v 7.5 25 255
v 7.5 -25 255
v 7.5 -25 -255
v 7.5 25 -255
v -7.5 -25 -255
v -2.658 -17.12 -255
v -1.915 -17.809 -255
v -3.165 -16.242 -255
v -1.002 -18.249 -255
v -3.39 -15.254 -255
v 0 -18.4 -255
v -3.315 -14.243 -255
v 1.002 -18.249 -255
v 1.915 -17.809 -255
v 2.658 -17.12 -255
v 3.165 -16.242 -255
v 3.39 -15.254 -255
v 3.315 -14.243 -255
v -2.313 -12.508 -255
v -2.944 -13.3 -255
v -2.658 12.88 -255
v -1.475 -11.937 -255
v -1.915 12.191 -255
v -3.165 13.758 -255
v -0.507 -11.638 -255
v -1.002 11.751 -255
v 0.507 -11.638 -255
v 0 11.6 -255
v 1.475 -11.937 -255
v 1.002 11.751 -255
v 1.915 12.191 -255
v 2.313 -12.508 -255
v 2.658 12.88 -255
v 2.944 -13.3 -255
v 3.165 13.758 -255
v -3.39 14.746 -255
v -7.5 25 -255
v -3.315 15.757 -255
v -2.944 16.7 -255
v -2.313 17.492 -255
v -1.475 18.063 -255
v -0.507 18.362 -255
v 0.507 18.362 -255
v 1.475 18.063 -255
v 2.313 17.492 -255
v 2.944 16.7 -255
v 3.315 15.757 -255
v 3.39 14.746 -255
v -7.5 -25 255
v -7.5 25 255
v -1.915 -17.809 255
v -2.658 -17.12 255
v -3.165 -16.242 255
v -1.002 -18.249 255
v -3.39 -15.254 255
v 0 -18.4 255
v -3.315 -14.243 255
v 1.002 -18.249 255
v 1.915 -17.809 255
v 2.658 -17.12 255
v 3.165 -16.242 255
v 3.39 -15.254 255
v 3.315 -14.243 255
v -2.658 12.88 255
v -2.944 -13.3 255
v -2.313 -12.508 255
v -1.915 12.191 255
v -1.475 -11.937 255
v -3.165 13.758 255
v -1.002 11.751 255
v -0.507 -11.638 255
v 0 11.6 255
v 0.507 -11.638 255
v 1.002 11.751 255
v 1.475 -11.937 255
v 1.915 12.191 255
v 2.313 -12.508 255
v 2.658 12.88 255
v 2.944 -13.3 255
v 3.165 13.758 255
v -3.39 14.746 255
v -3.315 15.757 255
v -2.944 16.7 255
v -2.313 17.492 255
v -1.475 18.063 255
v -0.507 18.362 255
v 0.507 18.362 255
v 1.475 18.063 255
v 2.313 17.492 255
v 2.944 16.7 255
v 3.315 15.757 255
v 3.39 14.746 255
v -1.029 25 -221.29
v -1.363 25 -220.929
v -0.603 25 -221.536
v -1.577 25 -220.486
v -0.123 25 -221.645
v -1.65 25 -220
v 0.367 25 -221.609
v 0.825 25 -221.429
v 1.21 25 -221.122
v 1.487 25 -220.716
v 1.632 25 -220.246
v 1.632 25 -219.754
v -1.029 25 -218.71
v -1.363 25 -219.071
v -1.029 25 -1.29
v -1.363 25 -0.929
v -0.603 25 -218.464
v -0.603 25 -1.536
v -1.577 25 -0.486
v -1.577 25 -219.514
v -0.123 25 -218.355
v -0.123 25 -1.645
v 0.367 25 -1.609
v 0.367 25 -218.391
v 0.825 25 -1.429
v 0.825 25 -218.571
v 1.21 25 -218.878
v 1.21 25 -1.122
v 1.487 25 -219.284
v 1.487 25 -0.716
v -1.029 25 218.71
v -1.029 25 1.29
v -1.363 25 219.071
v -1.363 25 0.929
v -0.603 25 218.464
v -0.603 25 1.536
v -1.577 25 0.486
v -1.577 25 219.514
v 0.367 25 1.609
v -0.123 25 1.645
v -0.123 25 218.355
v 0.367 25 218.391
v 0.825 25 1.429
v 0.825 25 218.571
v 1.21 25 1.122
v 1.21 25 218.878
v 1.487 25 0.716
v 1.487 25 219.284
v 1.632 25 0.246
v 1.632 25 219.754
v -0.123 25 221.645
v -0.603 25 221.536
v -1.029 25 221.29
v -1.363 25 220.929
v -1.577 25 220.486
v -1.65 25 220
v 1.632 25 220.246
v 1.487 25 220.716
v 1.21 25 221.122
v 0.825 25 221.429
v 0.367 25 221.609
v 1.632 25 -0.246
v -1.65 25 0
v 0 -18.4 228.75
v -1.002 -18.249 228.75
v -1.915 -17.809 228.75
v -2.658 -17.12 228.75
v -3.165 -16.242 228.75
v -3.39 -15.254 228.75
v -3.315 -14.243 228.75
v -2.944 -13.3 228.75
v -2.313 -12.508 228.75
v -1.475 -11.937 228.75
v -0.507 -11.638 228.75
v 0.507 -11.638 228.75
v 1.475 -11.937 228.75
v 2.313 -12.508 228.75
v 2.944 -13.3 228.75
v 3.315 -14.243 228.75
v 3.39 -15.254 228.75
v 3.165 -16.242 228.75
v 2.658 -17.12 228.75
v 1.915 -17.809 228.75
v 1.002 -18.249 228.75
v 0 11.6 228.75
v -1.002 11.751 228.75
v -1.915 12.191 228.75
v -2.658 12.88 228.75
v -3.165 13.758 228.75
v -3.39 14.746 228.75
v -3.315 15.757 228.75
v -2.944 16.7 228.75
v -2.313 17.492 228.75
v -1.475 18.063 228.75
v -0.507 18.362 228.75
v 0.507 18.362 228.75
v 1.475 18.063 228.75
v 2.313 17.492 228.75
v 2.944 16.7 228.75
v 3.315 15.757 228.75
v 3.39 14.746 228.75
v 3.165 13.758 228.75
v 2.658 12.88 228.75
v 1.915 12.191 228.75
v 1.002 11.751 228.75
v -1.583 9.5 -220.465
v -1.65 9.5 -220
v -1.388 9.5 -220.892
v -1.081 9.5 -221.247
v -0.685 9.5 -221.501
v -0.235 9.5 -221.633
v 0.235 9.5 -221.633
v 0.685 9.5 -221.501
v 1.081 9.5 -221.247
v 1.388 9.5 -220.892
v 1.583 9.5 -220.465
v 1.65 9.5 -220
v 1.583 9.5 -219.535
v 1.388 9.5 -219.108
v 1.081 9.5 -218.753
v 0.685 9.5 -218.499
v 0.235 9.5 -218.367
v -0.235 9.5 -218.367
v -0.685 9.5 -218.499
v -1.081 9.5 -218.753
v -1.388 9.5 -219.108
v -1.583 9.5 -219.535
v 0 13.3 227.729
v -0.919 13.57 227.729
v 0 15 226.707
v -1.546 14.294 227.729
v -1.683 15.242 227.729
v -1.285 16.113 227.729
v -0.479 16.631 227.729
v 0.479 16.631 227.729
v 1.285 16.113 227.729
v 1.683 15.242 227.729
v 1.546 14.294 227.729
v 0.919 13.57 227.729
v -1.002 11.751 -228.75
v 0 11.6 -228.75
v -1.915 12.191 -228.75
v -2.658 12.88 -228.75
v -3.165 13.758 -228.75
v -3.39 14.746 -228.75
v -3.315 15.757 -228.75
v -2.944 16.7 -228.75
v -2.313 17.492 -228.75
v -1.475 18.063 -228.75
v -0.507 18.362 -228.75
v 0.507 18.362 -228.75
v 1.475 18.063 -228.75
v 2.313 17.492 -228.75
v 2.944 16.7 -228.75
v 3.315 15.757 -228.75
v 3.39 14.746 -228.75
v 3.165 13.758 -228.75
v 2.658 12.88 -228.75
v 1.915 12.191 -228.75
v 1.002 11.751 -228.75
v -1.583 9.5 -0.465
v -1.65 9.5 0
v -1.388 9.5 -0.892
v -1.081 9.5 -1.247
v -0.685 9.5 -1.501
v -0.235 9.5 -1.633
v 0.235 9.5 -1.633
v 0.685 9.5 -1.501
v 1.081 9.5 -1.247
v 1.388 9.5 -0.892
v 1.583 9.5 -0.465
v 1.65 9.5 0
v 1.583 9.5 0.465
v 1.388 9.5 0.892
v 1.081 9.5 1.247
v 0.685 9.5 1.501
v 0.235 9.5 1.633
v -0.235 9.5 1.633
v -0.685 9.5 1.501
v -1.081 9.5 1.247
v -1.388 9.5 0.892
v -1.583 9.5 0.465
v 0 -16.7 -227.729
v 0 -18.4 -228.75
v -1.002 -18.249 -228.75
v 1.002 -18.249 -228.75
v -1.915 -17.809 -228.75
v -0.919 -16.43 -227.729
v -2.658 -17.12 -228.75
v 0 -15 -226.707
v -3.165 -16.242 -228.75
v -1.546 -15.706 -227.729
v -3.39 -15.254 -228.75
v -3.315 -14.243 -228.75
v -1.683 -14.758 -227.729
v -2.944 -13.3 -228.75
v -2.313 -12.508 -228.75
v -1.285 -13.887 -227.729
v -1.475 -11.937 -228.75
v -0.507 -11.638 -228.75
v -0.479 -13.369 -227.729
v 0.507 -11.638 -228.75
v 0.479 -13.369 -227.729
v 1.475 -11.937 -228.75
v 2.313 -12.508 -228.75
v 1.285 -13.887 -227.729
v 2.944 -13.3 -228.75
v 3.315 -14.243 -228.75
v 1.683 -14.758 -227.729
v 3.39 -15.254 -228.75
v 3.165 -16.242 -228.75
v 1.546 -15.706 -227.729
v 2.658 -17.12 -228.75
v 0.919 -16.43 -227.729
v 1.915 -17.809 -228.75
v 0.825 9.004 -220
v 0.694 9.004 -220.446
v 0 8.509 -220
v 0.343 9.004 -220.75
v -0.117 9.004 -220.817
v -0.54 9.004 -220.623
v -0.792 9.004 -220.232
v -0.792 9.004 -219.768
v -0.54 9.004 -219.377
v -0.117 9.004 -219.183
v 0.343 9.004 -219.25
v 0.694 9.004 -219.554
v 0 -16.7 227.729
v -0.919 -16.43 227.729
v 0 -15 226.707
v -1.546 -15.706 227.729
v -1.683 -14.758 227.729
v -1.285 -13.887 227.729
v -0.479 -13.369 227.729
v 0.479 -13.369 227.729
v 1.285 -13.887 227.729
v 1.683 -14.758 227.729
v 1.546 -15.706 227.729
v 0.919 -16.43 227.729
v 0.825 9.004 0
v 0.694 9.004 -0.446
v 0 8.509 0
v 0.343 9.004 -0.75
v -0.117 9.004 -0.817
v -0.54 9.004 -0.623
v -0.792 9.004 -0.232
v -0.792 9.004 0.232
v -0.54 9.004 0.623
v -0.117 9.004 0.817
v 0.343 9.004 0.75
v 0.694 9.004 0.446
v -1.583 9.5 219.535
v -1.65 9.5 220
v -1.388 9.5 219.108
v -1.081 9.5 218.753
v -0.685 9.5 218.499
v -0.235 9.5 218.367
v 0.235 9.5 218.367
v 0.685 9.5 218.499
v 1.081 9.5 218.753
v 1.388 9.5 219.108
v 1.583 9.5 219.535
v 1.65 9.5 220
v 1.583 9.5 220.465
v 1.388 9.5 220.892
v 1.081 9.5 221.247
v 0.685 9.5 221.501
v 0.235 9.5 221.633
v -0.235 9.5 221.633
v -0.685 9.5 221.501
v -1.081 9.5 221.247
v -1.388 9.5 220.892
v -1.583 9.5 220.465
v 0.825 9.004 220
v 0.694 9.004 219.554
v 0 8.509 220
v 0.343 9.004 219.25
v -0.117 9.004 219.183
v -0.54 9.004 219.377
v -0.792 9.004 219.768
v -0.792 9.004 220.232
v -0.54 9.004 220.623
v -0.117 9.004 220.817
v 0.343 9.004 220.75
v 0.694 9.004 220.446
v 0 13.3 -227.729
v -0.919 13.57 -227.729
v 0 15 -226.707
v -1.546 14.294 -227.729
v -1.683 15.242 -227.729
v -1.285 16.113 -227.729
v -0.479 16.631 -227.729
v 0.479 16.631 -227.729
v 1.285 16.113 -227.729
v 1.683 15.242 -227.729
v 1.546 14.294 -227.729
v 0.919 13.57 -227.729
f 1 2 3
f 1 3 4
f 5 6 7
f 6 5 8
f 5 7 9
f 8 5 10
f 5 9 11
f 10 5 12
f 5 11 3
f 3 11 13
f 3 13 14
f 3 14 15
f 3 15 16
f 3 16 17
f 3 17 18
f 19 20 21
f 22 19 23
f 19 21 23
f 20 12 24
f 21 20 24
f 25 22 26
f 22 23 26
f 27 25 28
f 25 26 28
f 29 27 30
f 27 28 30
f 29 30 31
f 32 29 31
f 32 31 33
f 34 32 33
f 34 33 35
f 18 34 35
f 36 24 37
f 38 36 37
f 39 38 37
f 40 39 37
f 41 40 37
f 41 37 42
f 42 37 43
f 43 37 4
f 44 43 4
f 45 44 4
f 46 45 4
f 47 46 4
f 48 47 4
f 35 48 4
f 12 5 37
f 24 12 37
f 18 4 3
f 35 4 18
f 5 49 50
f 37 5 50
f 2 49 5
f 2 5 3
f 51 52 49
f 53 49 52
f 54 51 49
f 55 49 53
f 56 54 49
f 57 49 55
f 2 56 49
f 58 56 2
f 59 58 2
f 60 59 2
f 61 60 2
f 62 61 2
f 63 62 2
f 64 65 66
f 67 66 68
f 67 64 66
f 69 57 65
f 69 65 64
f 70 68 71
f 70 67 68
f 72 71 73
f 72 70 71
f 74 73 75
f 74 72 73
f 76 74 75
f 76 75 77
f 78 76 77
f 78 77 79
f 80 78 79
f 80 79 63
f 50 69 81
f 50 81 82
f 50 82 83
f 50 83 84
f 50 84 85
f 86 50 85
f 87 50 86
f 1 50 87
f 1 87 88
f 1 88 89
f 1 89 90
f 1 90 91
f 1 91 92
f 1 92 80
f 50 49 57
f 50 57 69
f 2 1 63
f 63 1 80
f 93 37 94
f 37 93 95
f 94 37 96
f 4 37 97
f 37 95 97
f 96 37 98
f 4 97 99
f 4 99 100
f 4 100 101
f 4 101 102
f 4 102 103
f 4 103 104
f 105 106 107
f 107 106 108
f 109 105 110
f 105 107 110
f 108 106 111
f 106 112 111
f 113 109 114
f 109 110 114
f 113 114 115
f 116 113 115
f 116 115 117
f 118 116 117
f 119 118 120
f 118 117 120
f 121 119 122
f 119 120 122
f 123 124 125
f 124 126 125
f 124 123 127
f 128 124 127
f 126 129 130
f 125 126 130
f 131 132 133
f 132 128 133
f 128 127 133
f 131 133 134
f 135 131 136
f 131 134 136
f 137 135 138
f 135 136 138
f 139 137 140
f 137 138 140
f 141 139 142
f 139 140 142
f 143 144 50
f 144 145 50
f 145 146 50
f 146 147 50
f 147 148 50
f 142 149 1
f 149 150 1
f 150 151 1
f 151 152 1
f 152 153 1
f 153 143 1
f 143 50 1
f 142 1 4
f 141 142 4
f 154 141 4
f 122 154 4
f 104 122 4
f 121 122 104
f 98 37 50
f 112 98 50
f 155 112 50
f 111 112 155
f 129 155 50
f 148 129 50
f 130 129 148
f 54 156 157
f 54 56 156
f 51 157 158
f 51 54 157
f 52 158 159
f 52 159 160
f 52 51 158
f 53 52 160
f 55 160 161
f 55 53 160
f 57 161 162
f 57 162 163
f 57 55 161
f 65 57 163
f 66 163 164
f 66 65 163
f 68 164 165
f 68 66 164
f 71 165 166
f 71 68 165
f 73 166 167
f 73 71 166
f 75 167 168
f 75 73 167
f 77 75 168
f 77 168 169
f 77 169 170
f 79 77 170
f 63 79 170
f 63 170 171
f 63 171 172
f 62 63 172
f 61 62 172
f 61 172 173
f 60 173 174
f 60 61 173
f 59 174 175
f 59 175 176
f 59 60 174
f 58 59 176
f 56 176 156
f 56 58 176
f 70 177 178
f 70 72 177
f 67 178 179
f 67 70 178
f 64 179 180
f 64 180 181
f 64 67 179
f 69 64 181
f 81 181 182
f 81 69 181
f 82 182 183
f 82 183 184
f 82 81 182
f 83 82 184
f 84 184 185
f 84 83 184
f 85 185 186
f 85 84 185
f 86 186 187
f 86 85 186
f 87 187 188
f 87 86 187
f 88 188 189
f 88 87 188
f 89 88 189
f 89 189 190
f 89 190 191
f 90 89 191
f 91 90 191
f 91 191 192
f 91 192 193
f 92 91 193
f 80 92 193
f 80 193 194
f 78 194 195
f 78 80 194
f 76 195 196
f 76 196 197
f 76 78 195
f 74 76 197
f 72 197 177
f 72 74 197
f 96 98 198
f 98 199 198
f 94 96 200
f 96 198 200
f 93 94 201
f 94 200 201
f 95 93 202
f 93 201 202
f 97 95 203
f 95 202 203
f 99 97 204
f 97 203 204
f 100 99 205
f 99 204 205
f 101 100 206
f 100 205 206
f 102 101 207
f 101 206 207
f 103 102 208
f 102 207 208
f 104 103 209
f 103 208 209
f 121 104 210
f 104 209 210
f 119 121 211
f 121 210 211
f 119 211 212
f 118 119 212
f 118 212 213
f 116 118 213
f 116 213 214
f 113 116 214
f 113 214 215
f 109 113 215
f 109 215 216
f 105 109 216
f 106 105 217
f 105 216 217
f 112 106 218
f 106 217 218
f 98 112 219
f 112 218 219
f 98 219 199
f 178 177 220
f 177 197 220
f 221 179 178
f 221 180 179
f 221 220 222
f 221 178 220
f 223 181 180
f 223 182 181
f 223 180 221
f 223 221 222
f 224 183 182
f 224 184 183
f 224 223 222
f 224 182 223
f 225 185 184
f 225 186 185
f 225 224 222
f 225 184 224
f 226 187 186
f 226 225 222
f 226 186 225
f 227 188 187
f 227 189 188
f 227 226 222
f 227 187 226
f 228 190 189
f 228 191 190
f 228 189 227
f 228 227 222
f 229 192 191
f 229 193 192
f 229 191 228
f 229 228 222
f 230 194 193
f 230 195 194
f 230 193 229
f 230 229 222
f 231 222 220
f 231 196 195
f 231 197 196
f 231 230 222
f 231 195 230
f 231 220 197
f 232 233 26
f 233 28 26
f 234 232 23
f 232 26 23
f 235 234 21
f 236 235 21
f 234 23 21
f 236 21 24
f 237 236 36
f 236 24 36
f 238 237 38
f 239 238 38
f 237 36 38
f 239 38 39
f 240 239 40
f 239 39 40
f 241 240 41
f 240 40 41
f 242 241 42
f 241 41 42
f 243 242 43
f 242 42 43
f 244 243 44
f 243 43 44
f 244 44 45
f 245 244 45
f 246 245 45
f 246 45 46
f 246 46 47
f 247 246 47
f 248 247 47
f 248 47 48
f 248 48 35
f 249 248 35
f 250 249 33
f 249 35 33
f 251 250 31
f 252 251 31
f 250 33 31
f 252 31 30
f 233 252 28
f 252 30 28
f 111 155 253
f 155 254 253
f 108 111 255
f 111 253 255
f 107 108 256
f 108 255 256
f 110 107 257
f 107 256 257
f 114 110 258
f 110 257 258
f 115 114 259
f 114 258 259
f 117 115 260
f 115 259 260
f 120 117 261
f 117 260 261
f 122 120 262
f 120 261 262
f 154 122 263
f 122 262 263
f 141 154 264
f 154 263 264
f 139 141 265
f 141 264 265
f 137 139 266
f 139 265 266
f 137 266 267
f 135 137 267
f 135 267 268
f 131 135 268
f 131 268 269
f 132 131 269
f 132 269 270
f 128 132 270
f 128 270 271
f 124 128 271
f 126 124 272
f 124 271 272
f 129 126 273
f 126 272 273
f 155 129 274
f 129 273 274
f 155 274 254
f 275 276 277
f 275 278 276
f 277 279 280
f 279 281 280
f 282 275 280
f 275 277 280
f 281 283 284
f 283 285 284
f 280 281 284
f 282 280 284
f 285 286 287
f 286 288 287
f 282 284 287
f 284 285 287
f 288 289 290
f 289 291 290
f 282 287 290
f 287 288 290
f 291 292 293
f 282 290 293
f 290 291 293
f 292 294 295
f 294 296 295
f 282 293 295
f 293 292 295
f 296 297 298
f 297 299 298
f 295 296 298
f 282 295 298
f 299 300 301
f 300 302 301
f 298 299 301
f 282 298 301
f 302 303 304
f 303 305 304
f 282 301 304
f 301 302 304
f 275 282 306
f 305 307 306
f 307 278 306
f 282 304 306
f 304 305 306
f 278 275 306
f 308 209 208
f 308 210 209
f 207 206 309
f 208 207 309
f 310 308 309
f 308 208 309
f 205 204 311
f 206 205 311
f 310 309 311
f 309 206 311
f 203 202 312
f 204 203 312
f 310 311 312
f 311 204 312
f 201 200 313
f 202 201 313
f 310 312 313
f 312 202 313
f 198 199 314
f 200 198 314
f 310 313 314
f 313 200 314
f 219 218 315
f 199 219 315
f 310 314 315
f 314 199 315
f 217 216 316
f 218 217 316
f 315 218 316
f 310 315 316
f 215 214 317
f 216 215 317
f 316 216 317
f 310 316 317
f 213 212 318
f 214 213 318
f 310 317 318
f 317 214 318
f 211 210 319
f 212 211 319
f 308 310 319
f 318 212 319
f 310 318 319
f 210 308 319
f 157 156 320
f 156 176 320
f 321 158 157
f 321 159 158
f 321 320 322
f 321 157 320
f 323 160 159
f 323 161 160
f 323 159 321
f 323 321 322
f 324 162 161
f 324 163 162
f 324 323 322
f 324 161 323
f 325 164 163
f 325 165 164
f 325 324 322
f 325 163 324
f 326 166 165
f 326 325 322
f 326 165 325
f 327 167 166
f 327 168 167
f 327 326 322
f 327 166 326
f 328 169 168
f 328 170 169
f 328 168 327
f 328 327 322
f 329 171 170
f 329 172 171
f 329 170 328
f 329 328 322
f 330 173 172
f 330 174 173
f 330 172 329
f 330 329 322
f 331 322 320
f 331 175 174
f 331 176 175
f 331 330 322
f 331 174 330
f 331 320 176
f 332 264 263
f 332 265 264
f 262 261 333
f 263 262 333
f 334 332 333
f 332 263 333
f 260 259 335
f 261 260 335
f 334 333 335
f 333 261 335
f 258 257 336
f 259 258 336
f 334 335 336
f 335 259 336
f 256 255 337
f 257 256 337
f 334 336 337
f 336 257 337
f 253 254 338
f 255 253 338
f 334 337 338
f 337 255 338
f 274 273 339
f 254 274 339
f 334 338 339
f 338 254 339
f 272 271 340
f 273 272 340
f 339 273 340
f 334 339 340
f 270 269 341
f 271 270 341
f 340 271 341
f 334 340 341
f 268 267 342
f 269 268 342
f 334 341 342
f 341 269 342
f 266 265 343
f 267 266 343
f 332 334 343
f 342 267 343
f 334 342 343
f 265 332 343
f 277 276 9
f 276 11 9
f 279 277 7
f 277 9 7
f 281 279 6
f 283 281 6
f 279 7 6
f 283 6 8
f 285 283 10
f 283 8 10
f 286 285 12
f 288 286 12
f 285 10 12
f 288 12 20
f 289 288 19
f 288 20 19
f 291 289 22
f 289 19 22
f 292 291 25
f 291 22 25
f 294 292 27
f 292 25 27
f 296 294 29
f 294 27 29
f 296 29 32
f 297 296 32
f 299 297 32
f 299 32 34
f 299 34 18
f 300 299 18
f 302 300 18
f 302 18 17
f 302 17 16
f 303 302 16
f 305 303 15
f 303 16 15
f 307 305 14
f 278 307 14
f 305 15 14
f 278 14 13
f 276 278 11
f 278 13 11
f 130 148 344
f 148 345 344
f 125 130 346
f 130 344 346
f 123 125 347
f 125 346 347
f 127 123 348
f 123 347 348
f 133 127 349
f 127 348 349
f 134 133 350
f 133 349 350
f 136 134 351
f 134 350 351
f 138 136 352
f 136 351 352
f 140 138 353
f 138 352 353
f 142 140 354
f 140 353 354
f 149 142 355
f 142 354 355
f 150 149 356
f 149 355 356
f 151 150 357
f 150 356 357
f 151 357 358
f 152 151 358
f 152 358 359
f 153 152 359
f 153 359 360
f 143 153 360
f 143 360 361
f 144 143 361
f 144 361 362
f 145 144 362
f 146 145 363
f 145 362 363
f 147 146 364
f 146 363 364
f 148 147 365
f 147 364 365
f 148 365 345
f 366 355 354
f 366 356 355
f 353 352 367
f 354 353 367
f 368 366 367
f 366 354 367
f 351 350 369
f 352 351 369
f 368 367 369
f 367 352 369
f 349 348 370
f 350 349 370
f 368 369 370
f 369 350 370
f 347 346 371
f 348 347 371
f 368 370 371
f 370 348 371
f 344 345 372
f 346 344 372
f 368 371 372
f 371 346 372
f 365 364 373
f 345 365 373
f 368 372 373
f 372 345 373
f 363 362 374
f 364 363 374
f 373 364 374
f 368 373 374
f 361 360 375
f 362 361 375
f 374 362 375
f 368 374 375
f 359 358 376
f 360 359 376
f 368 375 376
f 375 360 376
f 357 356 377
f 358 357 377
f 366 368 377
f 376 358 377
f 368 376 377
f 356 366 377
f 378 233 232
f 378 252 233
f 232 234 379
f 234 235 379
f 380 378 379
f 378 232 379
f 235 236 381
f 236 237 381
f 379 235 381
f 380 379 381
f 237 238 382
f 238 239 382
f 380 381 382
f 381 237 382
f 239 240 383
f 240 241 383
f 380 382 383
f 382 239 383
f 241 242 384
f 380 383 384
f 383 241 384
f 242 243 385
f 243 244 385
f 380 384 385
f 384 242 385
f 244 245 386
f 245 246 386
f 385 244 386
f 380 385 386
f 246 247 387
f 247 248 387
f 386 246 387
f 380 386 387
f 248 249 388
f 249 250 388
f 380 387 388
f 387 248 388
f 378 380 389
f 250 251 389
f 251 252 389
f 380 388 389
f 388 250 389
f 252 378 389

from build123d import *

# Parameters (mm, degrees)
SCHIZZO1_W                     = 15
SCHIZZO1_H                     = 50
ESTRUSIONE1_DEPTH              = 255
FORO_FILETTATO_M8_1_AT_2_COUNT = 2
FORO_FILETTATO_M8_1_AT_2_PITCH = 30
FORO_FILETTATO_M4_1_D          = 3.3
FORO_FILETTATO_M4_1_DEPTH      = 15.5
FORO_FILETTATO_M4_1_TIP        = 0.991420021


with BuildPart() as part:
    # Schizzo1 → Estrusione1 (new, symmetric)
    with BuildSketch(Plane.XY):
        Rectangle(SCHIZZO1_W, SCHIZZO1_H)
    extrude(amount=ESTRUSIONE1_DEPTH, both=True)

    # Schizzo3 → Foro filettato M8-1 (revolve, cut)
    with BuildSketch(Plane(origin=(0, 15, 255), x_dir=(0, -1, 0), z_dir=(1, 0, 0))):
        Polygon((0, 0), (0, 28.292926105), (3.4, 26.25), (3.4, 0), align=None)
    foro_filettato_m8_1 = revolve(axis=Axis((0, 15, 261.35), (0, 0, -1)), mode=Mode.SUBTRACT)

    # Foro filettato M8-1 at 2: Foro filettato M8-1 ×2
    with Locations(*[(0, -i * FORO_FILETTATO_M8_1_AT_2_PITCH, 0) for i in range(1, FORO_FILETTATO_M8_1_AT_2_COUNT)]):
        add(foro_filettato_m8_1, mode=Mode.SUBTRACT)

    # Specchia1: Foro filettato M8-1 across plane
    add(foro_filettato_m8_1.mirror(Plane.XY), mode=Mode.SUBTRACT)

    # Specchia1 copy 1 sketch → Specchia1 copy 1 (revolve, cut)
    with BuildSketch(Plane(origin=(0, -15, -255), x_dir=(0, -1, 0), z_dir=(1, 0, 0))):
        Polygon((0, 0), (0, -28.292926105), (3.4, -26.25), (3.4, 0), align=None)
    revolve(axis=Axis((0, -15, -261.35), (0, 0, -1)), mode=Mode.SUBTRACT)

    # Foro filettato M4-1
    with Locations(Plane(origin=(0, 25, 0), x_dir=(1, 0, 0), z_dir=(0, 1, 0))):
        with Locations((0, 0), (0, 220), (0, -220)):
            Hole(FORO_FILETTATO_M4_1_D / 2, depth=FORO_FILETTATO_M4_1_DEPTH)
            with Locations((0, 0, -(FORO_FILETTATO_M4_1_DEPTH + FORO_FILETTATO_M4_1_TIP / 2))):  # 118° drill point
                Cone(0, FORO_FILETTATO_M4_1_D / 2, FORO_FILETTATO_M4_1_TIP, mode=Mode.SUBTRACT)


solid = part.part
